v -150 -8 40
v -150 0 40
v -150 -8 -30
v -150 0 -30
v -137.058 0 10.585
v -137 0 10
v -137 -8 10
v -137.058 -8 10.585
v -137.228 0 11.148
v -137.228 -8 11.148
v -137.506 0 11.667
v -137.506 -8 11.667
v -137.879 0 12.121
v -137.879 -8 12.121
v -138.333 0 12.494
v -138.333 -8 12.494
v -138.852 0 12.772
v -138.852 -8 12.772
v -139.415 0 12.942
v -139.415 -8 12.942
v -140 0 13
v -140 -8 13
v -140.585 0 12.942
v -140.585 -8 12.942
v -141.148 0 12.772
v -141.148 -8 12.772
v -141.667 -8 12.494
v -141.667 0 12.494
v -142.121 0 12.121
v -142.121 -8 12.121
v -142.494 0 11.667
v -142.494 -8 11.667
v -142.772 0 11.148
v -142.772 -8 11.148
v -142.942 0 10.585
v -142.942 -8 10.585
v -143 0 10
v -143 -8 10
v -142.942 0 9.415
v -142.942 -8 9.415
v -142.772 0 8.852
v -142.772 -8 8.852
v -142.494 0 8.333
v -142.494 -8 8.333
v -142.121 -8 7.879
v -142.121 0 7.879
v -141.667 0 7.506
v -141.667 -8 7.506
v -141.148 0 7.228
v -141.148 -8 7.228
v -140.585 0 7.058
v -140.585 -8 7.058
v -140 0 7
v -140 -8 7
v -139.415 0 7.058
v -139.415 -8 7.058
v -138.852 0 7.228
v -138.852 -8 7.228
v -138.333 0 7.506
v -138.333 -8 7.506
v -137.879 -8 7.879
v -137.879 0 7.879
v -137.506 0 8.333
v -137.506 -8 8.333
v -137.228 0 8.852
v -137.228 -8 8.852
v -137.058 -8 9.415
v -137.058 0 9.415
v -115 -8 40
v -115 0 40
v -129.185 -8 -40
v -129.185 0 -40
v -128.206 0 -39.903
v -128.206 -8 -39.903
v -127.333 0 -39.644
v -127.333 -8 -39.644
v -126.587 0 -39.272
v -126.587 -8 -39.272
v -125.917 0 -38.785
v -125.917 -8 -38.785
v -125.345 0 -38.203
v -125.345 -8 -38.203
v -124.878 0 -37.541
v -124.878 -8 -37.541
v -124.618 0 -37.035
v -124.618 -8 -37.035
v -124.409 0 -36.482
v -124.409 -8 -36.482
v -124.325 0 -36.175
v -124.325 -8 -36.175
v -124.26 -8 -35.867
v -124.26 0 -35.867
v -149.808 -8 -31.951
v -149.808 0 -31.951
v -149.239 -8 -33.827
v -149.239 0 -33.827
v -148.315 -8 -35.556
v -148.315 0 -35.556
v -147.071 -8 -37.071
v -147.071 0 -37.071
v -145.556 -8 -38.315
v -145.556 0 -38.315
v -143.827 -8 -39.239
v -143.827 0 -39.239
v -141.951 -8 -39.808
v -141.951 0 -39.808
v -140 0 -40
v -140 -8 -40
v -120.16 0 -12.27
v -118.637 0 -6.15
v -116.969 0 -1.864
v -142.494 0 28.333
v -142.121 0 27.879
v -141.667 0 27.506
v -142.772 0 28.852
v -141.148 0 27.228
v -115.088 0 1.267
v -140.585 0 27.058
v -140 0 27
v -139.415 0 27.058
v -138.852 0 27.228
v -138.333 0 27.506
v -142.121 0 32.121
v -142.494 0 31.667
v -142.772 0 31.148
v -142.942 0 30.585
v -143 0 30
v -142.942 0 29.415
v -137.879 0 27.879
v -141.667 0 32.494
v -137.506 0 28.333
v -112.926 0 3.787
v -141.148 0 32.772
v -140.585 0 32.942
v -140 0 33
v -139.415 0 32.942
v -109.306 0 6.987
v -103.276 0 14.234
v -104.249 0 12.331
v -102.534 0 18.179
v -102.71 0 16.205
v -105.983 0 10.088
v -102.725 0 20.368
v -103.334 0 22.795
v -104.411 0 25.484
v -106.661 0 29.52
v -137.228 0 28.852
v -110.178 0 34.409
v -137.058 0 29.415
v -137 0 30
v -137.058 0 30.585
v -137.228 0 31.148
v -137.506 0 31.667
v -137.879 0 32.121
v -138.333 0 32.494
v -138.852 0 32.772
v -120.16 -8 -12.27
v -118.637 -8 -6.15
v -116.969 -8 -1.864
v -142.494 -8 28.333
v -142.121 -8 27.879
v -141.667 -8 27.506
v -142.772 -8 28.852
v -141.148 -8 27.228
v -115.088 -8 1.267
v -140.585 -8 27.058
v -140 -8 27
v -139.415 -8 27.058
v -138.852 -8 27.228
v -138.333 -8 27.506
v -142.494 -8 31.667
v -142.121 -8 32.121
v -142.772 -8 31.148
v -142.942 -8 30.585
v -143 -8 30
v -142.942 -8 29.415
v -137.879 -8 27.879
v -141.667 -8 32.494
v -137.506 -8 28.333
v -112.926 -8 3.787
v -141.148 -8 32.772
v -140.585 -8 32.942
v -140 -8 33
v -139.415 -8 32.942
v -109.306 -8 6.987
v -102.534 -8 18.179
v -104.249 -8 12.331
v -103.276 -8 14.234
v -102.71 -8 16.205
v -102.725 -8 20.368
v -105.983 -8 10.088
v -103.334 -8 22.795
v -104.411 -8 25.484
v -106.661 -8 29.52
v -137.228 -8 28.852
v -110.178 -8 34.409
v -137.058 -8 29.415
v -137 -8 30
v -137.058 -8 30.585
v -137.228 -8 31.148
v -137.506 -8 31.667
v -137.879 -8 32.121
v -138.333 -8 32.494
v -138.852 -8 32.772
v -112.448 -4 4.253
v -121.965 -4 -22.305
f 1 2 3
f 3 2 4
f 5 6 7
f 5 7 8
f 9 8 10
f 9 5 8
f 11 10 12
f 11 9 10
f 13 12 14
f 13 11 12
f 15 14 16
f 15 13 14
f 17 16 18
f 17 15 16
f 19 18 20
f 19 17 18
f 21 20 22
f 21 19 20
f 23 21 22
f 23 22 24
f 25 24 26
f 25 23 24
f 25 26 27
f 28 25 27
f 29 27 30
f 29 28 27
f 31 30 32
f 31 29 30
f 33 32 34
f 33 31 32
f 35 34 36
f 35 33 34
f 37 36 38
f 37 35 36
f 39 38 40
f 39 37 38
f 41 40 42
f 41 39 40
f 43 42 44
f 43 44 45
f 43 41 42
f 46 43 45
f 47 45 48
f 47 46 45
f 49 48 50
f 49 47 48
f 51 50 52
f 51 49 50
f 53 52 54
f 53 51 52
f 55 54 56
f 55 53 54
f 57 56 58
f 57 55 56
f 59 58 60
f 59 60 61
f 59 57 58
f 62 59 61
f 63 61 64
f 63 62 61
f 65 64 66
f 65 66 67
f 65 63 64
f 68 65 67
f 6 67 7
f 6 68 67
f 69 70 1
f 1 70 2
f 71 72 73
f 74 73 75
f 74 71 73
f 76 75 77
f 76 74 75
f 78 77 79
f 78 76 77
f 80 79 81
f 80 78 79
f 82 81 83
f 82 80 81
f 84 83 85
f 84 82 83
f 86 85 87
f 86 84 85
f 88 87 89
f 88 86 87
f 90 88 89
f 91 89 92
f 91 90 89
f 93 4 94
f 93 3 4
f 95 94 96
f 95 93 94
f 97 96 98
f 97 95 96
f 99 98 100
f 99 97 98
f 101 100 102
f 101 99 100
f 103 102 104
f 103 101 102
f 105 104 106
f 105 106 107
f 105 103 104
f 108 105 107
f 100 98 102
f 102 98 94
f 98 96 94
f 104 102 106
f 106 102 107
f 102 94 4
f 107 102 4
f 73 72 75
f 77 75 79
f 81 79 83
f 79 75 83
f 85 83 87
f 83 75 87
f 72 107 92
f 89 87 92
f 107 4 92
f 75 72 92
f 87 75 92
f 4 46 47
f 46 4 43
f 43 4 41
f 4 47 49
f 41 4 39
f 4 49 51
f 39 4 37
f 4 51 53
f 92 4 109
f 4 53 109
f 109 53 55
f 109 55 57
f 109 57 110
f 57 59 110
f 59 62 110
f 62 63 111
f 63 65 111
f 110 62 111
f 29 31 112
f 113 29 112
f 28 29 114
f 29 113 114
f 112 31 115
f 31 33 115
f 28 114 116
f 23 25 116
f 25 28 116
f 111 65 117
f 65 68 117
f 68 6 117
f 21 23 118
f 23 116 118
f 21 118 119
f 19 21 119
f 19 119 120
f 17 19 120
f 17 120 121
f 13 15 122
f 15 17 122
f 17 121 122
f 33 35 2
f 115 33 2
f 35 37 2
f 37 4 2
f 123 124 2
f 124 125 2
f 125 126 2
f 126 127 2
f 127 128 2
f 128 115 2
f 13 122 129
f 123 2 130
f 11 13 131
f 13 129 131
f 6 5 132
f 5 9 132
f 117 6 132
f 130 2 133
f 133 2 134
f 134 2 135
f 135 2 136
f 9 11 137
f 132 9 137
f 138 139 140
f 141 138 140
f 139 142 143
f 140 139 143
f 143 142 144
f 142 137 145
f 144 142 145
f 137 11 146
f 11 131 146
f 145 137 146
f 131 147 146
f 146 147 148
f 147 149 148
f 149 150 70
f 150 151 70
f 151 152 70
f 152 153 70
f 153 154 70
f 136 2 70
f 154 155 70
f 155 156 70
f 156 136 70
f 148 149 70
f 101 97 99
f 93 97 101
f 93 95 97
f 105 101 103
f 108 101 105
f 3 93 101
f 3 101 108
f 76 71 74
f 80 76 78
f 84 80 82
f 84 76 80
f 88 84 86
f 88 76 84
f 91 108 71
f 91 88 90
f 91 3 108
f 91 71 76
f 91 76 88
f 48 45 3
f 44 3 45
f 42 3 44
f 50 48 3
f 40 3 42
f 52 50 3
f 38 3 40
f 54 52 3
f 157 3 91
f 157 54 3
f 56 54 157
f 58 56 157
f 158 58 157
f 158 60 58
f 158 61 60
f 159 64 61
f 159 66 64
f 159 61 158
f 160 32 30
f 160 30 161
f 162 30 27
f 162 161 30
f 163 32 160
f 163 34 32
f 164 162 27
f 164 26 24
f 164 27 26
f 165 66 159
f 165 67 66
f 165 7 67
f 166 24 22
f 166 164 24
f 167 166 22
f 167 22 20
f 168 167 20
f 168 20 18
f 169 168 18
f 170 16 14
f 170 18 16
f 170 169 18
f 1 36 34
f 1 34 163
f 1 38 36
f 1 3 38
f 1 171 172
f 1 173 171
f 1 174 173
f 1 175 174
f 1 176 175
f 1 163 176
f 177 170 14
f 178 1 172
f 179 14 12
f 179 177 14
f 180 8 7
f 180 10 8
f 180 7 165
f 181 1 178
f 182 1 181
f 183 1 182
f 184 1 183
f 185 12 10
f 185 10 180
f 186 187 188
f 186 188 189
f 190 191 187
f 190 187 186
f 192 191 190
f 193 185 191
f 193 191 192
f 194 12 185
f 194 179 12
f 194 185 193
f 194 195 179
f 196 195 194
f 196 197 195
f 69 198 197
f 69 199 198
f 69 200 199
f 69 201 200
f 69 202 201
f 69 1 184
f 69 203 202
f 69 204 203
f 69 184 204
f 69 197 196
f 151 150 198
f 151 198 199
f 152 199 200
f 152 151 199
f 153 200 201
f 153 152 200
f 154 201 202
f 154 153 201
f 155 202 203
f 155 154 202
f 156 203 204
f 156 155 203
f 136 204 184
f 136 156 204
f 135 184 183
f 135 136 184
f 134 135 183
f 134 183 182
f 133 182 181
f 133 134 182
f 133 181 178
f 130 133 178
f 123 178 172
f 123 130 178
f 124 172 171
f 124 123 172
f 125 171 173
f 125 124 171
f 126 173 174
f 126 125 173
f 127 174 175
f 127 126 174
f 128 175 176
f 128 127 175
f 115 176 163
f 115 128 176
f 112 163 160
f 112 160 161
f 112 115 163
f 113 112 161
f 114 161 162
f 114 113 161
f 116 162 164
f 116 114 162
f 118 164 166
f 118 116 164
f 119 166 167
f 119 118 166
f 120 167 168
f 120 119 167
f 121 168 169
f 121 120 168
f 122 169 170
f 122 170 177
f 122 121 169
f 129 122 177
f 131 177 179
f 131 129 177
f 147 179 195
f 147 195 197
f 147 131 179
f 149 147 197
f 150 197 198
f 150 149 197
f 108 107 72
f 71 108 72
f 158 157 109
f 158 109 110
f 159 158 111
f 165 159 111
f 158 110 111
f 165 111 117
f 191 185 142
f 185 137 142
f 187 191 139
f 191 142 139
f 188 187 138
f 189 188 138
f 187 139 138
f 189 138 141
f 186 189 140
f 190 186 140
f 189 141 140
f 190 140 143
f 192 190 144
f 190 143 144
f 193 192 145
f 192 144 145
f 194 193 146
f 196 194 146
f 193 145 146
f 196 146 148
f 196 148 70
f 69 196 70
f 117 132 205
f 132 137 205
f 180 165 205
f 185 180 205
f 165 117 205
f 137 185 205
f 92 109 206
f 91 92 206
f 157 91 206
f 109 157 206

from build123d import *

# Parameters (mm, degrees)
F0_R     = 3
F2_DEPTH = 8
F3_R     = 10
F4_R     = 5


with BuildPart() as f2:
    # F0 (on Front) → F2 (new body)
    with BuildSketch(Plane.XZ):
        with BuildLine():
            Line((-115, 40), (-150, 40))
            Line((-150, 40), (-150, -40))
            Line((-150, -40), (-125, -40))
            add(Edge.make_bspline(
                [(-125, -40), (-119.8519719708, -11.7183000191), (-120.3236686159, 4.6519688966), (-92.7757024765, 15.9931648523), (-115, 40)],
                knots=[0, 0, 0, 0, 0.5311625984, 1, 1, 1, 1], degree=3))
        make_face()
        with Locations((-140, 10)):
            Circle(F0_R, mode=Mode.SUBTRACT)
        with Locations((-140, 30)):
            Circle(F0_R, mode=Mode.SUBTRACT)
    extrude(amount=F2_DEPTH)

    # F3
    f3_edges = [f2.edges().sort_by_distance(p)[0] for p in [
        (-150, -4, -40),
    ]]
    fillet(f3_edges, radius=F3_R)

    # F4
    f4_edges = [f2.edges().sort_by_distance(p)[0] for p in [
        (-125, -4, -40),
    ]]
    fillet(f4_edges, radius=F4_R)


solid = f2.part
